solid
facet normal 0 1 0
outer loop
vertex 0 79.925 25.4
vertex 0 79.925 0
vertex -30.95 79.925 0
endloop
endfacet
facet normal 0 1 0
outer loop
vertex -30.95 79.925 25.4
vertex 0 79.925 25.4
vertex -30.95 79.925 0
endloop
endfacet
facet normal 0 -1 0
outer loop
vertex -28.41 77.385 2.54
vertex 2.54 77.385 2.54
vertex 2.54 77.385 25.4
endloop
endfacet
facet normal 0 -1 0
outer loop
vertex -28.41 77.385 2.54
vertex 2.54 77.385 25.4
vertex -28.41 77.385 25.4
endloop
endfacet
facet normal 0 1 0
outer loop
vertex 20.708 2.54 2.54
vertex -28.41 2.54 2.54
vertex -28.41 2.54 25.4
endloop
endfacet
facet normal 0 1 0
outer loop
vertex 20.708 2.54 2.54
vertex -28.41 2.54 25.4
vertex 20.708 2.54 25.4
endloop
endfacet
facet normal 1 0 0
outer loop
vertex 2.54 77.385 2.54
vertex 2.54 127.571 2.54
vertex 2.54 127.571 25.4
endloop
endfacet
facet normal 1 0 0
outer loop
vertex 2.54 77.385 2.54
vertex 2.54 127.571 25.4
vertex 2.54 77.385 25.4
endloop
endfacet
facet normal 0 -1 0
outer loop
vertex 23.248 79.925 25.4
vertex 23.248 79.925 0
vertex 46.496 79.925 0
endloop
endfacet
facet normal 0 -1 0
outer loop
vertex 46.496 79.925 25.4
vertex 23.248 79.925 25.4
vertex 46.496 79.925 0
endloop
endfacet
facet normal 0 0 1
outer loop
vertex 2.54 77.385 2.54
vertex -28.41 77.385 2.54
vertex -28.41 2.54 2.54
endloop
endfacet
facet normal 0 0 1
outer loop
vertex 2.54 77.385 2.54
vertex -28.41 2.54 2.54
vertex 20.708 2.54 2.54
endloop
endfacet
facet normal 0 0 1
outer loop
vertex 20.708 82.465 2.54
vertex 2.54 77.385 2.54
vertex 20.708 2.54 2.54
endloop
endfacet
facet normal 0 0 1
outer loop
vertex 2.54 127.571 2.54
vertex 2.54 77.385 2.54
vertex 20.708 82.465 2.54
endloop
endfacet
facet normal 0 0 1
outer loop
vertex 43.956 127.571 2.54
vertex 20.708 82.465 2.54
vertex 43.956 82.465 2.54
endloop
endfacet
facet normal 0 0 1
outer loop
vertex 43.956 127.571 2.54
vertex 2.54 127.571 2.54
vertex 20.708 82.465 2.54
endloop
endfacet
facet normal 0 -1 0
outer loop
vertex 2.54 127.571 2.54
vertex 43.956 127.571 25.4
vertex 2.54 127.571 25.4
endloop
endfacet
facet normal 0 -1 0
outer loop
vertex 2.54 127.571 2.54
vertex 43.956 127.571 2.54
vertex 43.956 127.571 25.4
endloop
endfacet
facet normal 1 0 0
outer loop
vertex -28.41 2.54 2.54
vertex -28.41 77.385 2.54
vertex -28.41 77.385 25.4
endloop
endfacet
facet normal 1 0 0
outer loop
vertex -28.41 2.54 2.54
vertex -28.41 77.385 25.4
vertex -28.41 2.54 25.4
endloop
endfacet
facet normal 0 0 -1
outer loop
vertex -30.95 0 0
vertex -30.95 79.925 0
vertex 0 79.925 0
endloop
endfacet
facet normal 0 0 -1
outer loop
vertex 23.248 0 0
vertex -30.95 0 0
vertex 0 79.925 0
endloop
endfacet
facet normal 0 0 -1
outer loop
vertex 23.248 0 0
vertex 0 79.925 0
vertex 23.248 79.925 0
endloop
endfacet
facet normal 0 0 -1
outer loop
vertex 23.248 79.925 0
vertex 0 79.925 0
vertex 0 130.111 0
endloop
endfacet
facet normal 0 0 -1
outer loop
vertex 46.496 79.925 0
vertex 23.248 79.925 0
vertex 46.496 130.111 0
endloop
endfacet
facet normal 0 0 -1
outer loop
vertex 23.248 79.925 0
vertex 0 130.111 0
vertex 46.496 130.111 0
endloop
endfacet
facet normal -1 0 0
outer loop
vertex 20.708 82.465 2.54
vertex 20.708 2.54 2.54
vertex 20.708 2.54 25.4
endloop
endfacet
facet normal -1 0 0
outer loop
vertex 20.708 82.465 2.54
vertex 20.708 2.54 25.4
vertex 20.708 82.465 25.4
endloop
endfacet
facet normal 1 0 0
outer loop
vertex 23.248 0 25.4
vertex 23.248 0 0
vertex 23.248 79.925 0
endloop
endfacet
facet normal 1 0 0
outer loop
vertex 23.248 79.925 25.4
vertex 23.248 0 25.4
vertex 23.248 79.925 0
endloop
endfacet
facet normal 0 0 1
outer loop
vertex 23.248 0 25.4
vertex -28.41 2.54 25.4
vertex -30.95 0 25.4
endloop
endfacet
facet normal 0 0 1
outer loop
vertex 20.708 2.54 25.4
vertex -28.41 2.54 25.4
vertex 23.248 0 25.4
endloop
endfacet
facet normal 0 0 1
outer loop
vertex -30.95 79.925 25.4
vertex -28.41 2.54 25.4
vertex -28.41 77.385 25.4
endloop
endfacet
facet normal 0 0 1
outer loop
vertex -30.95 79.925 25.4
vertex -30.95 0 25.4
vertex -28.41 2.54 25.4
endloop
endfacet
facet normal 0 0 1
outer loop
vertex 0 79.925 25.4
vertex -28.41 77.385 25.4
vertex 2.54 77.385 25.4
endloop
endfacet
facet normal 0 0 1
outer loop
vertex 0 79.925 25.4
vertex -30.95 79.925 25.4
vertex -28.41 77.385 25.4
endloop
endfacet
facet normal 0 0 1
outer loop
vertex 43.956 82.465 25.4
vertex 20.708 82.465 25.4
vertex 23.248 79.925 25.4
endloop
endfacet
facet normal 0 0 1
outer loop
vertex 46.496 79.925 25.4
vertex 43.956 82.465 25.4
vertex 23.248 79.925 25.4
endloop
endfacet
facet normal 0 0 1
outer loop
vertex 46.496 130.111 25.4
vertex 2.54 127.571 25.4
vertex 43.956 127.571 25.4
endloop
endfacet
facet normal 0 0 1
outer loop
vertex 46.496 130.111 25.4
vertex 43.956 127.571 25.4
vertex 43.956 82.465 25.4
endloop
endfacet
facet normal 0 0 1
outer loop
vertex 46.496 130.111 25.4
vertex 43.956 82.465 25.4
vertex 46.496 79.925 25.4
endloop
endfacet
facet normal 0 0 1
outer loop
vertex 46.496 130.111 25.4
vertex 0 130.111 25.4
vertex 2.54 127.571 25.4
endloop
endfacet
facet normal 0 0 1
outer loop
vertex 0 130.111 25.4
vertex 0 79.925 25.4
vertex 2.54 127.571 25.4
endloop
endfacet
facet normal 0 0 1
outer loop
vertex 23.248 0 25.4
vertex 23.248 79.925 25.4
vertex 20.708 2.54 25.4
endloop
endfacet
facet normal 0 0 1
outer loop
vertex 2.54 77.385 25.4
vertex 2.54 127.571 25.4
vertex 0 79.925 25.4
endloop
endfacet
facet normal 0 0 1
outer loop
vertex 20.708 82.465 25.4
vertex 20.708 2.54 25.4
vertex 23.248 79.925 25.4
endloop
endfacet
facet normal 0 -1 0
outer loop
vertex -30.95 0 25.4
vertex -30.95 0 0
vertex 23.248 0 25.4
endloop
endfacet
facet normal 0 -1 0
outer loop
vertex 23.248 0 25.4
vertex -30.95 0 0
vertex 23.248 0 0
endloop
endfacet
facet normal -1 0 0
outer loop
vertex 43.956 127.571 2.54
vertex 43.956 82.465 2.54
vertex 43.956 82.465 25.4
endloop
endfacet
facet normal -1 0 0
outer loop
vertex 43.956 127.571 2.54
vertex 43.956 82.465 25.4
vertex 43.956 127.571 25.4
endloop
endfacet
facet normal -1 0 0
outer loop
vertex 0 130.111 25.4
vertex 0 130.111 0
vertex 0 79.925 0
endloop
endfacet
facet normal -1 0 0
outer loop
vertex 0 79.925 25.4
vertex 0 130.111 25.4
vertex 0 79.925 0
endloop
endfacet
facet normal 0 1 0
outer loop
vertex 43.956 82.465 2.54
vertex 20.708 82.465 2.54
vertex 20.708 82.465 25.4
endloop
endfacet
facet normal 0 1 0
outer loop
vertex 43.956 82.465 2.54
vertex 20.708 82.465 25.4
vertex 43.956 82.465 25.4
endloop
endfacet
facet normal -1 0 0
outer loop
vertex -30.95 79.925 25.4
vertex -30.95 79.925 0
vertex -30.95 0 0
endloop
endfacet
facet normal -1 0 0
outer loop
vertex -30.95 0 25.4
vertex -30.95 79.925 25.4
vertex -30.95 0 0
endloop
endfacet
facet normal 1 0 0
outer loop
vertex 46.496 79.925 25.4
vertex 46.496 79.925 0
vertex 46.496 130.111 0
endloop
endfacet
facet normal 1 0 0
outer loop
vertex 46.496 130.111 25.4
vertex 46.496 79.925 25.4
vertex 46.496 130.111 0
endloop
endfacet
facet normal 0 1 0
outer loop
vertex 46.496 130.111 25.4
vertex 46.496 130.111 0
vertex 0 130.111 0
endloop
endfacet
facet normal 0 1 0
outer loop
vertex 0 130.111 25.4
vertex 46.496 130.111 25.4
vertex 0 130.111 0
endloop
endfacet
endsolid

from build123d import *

# Parameters (mm, degrees)
F1_DEPTH = 25.4
F2_T     = -2.54


with BuildPart() as f1:
    # F0 (on Top) → F1 (new body)
    with BuildSketch(Plane.XY):
        Polygon((0, 130.1105469465), (0, 79.9251422286), (23.2478752732, 79.9251422286), (46.4957505465, 79.9251422286), (46.4957505465, 130.1105469465), align=None)
        Polygon((23.2478752732, 79.9251422286), (0, 79.9251422286), (-30.9502854943, 79.9251422286), (-30.9502854943, 0), (23.2478752732, 0), align=None)
    extrude(amount=F1_DEPTH)

    # F2
    f2_openings = [f1.faces().sort_by_distance(p)[0] for p in [
        (5.635859, 62.737644, 25.4),
    ]]
    offset(amount=F2_T, openings=f2_openings, kind=Kind.INTERSECTION)


solid = f1.part
